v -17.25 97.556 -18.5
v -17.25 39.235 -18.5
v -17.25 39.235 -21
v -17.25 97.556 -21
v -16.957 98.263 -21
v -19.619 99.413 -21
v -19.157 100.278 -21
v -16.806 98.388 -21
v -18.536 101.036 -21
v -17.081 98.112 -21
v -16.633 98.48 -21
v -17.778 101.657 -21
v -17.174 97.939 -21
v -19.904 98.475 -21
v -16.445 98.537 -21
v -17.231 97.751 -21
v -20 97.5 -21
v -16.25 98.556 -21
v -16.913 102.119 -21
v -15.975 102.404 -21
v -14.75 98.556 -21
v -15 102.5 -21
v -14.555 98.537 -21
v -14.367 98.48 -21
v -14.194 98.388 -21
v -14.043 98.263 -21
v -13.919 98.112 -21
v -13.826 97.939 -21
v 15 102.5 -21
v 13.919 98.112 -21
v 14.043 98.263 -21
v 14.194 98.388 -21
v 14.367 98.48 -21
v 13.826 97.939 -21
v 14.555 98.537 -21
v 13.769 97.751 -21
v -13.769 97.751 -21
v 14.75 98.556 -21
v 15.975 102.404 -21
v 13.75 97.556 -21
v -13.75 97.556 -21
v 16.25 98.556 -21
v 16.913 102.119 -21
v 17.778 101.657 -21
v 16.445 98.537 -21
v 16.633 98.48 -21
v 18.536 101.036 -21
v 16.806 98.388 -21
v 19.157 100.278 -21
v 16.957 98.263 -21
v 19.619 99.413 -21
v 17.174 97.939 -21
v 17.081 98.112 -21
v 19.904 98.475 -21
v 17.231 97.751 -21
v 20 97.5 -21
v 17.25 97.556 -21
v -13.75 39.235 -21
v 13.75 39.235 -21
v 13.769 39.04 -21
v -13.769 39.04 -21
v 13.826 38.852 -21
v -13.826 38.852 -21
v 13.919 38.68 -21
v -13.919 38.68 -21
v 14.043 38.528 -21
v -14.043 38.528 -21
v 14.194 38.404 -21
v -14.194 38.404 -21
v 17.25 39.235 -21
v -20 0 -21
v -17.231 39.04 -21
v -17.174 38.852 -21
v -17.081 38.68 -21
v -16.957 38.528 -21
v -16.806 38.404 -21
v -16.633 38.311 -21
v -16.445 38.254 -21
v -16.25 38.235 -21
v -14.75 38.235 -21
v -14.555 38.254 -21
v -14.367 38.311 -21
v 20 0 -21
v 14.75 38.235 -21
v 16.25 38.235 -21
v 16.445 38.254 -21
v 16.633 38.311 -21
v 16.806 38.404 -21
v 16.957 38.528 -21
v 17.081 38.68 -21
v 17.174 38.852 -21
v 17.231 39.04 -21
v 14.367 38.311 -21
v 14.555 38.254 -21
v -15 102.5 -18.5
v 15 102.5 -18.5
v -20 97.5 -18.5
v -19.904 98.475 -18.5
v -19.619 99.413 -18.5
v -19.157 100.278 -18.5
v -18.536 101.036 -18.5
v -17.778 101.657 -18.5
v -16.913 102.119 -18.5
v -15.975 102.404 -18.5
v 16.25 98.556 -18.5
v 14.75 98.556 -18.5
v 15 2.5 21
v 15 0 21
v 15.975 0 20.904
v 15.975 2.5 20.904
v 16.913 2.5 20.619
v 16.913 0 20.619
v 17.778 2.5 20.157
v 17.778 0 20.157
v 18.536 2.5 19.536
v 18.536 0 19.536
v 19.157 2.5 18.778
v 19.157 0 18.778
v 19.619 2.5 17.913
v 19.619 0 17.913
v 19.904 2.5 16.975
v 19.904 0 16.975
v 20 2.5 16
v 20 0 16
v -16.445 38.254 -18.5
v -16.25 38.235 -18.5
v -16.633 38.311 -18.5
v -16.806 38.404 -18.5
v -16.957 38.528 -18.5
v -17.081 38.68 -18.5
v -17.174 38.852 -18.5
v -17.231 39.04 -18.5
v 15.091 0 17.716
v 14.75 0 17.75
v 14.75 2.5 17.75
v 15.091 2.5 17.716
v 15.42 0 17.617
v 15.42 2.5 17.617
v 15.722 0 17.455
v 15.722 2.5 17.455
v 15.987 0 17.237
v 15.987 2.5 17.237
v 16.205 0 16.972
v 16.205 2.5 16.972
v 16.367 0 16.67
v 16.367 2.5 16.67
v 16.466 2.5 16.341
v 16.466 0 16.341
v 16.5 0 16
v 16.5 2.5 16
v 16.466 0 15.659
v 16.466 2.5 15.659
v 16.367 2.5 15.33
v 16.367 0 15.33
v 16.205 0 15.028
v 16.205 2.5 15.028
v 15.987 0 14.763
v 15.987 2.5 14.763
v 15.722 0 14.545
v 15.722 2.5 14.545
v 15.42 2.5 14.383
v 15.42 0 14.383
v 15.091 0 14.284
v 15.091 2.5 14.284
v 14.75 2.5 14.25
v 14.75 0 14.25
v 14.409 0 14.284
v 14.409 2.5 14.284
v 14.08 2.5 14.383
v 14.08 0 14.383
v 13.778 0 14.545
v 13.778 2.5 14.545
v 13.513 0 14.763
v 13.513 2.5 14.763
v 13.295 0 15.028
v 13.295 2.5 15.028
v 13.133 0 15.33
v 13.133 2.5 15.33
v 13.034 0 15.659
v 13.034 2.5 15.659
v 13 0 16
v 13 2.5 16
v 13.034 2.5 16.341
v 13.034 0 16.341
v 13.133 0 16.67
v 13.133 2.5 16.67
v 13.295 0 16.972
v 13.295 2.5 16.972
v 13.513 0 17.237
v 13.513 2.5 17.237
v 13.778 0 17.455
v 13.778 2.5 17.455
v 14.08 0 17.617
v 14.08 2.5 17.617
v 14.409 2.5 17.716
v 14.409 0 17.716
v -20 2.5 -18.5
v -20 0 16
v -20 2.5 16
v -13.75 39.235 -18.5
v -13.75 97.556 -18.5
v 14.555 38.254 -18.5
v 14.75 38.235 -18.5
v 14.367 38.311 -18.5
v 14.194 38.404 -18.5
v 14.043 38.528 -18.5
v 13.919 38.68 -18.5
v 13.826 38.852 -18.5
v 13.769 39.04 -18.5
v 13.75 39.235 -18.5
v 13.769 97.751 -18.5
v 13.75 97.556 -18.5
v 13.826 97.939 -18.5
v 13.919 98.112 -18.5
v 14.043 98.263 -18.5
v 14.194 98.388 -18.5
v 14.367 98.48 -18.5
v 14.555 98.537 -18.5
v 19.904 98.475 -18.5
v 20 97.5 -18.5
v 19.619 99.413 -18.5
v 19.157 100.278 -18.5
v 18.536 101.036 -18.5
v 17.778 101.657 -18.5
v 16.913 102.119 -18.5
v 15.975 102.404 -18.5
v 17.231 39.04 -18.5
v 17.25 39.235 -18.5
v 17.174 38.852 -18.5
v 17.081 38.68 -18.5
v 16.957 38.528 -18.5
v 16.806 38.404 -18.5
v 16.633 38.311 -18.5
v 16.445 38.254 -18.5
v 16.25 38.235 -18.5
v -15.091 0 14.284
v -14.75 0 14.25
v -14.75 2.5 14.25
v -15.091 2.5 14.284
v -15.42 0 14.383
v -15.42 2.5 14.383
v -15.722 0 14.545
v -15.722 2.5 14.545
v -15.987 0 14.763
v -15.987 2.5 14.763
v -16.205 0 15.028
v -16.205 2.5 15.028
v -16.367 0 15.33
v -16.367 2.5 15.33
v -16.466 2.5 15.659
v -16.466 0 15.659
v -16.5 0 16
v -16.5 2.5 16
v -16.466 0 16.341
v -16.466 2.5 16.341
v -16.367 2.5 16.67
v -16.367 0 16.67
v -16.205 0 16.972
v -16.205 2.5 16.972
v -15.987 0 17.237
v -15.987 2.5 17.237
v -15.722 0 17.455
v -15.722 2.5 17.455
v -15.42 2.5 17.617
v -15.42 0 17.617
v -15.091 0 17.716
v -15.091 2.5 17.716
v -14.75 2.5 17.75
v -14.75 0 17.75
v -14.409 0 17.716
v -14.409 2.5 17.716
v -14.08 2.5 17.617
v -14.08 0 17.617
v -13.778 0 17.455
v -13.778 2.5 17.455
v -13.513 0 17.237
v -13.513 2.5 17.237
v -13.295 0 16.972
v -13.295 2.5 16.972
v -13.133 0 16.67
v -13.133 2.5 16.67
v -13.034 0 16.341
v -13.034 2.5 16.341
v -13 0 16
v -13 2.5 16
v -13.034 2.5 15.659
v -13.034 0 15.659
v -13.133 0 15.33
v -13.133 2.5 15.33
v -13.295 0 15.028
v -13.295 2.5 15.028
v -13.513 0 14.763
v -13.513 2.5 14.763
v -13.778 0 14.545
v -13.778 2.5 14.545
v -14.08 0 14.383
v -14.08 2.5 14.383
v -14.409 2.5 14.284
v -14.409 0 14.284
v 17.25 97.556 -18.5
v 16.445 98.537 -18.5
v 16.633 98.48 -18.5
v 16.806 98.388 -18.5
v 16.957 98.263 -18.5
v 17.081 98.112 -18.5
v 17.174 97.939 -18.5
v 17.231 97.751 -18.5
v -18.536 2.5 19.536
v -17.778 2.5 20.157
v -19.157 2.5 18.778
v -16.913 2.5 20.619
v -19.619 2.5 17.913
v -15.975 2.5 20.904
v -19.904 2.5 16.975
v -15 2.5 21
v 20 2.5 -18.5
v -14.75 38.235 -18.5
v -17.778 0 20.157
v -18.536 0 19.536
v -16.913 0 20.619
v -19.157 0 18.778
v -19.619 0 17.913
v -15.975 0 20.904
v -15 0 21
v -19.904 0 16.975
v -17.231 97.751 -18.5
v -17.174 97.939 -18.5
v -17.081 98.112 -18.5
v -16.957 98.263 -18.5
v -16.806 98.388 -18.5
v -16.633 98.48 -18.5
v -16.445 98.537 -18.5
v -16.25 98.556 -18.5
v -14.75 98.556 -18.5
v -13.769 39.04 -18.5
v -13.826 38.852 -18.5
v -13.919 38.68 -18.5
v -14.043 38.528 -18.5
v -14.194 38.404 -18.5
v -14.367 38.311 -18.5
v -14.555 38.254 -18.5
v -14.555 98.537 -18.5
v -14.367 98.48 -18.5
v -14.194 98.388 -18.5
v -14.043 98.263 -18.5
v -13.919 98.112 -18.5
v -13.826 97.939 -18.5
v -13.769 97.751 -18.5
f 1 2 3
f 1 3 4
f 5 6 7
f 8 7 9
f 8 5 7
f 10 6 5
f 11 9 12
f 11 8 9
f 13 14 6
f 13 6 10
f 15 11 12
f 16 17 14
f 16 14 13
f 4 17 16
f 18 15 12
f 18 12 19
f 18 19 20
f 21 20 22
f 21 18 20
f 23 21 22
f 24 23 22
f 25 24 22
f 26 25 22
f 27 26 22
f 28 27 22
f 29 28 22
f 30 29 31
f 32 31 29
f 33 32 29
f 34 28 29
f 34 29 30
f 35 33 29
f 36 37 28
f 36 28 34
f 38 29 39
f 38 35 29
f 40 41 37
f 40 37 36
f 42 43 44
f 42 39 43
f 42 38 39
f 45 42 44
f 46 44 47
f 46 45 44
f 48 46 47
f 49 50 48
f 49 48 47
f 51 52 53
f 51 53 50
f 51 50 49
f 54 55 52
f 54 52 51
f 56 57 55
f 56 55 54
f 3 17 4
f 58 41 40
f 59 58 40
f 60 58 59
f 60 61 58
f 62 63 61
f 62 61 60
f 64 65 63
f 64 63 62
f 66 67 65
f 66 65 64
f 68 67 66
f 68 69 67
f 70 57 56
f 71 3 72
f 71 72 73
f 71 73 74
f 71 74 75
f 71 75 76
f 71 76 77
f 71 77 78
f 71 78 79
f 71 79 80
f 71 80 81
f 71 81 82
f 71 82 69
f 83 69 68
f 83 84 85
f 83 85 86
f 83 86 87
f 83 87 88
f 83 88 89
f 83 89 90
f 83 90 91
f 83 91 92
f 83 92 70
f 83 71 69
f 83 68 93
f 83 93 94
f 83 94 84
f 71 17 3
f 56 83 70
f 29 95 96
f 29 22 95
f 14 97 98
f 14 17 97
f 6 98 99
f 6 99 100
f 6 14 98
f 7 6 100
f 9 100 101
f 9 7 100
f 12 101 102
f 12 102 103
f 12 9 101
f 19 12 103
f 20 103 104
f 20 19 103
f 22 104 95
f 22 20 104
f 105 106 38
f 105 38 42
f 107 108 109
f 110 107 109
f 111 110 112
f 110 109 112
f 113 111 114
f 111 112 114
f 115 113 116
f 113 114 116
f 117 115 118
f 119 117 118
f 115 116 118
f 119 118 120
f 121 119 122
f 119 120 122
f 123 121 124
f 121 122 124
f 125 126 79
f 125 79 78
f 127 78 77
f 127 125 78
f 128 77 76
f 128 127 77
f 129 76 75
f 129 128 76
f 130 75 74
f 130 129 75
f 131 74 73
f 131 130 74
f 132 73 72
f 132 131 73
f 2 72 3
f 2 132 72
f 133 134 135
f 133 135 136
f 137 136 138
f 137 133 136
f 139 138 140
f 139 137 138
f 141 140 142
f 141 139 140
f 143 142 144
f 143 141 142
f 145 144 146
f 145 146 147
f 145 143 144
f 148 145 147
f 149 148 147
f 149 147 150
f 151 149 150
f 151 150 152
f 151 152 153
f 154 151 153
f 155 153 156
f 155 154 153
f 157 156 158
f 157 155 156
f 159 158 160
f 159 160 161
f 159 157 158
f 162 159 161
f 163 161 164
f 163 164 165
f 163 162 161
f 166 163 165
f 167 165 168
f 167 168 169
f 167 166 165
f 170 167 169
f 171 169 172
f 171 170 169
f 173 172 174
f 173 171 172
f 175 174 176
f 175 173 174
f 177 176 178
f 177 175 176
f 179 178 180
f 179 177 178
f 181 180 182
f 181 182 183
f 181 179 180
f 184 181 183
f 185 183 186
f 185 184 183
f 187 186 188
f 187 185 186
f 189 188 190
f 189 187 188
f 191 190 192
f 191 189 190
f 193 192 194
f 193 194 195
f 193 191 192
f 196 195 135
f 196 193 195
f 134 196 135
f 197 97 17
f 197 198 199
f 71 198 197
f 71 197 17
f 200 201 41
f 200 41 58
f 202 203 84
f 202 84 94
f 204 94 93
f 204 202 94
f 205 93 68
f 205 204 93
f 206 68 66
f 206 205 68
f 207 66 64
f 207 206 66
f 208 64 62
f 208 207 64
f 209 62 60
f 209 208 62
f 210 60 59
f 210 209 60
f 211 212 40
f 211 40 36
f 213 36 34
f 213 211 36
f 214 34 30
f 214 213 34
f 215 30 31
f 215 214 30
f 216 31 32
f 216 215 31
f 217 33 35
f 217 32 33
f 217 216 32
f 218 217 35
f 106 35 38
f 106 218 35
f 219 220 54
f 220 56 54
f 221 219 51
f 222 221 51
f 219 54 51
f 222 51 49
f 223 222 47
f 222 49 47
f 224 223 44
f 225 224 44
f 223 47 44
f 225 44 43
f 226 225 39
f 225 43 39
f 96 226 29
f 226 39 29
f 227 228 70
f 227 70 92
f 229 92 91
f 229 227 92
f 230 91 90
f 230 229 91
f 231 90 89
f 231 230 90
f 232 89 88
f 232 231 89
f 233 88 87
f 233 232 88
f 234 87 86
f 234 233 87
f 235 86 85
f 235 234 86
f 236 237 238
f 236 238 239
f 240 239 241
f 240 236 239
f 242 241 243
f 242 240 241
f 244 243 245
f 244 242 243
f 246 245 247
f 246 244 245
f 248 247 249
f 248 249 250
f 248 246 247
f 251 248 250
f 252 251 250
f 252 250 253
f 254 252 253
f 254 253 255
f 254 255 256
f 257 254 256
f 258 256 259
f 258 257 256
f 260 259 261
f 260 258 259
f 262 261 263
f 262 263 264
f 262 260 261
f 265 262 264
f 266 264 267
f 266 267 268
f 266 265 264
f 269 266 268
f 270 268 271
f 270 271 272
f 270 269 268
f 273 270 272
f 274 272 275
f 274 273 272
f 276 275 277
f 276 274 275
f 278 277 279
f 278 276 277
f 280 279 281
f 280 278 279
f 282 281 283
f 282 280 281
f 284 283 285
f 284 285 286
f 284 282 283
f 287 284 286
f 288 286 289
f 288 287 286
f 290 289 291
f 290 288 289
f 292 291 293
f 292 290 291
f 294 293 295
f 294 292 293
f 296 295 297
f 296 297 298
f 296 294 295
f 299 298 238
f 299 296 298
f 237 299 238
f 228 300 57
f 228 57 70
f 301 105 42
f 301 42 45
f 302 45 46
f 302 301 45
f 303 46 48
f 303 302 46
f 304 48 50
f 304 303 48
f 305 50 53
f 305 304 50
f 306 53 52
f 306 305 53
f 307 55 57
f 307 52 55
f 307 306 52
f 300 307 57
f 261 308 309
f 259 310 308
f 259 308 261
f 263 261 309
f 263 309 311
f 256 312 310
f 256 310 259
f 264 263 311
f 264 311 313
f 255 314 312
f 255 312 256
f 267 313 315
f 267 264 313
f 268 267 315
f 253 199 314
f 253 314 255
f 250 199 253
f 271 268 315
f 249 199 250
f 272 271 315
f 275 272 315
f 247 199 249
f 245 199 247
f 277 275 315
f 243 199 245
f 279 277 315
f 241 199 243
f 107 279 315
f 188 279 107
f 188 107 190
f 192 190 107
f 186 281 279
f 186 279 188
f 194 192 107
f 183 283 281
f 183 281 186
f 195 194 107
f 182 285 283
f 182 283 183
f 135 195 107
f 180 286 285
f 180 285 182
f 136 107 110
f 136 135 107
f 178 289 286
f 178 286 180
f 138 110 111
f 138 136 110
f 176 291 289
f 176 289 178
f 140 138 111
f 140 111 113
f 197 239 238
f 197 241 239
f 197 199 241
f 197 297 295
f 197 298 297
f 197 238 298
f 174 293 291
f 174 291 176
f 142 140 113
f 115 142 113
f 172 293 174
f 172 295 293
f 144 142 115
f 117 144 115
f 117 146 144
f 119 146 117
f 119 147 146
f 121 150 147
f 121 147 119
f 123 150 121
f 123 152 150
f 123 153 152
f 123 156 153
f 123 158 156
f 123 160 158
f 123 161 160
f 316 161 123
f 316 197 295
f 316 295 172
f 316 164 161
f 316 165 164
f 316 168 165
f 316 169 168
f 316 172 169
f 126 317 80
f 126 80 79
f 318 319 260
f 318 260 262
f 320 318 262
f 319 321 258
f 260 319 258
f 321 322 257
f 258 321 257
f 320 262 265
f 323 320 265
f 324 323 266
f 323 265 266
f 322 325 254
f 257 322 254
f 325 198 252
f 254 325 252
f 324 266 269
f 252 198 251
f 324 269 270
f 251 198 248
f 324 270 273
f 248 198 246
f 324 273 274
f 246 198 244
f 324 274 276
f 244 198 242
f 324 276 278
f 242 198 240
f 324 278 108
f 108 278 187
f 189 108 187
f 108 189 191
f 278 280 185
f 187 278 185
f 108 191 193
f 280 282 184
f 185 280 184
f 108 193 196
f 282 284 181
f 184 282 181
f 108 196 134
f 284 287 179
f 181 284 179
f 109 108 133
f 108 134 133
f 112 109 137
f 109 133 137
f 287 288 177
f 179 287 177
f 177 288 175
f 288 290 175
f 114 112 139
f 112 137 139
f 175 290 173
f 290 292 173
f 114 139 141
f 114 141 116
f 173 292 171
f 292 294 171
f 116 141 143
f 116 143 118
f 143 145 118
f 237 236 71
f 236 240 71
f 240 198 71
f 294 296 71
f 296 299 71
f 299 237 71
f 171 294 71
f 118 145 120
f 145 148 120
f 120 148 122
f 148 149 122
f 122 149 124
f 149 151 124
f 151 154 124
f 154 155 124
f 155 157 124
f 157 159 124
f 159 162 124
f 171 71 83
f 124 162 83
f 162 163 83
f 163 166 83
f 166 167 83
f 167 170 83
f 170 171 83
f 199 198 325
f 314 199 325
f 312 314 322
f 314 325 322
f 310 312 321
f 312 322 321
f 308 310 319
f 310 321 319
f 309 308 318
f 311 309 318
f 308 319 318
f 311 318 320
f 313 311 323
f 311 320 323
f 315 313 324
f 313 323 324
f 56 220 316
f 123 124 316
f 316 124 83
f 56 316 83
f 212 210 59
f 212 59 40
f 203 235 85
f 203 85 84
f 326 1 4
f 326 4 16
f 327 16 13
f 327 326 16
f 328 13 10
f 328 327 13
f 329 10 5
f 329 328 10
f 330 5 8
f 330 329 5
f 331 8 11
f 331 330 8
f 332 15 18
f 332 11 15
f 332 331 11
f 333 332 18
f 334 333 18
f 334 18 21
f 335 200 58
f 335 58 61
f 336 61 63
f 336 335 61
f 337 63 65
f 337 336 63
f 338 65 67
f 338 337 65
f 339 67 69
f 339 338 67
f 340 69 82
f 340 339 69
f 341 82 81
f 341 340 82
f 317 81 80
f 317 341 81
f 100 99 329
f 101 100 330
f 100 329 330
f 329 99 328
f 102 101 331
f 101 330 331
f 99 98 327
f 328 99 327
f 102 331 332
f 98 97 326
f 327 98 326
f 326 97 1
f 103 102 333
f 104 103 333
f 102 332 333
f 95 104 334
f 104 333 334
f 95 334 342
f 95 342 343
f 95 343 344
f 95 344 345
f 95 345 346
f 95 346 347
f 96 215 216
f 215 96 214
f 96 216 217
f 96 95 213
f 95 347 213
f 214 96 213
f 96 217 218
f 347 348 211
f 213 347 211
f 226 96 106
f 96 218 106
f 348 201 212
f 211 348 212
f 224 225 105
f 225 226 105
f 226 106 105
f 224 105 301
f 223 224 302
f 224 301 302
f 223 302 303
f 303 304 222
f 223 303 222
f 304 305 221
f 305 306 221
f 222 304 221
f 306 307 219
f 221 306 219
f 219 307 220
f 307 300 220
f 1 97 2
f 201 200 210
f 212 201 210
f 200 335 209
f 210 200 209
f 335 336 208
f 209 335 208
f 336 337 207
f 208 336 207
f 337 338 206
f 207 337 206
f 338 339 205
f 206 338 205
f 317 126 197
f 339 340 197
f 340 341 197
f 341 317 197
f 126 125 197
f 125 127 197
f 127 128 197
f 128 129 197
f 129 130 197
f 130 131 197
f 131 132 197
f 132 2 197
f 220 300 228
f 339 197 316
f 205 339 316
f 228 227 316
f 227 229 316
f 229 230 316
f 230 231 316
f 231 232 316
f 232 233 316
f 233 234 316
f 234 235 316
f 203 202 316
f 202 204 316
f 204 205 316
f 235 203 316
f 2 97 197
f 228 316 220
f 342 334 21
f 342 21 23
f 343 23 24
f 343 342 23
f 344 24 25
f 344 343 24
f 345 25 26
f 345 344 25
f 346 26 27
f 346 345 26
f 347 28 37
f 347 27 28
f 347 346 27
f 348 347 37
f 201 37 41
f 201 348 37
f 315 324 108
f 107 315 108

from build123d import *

# Parameters (mm, degrees)
SKETCH1_R           = 1.75
BOSS_EXTRUDE1_DEPTH = 2.5
SKETCH2_W           = 40
SKETCH2_H           = 2.5
BOSS_EXTRUDE2_DEPTH = 100
FILLET1_R           = 5
CUT_EXTRUDE1_DEPTH  = 112.653481809


with BuildPart() as part:
    # Sketch1 → Boss-Extrude1 (new body)
    with BuildSketch(Plane(origin=(0, 0, 0), x_dir=(1, 0, 0), z_dir=(0, 1, 0))):
        with BuildLine():
            Line((20, 21), (-20, 21))
            Line((-20, 21), (-20, -16))
            ThreePointArc((-20, -16), (-18.535533906, -19.535533906), (-15, -21))
            Line((-15, -21), (15, -21))
            ThreePointArc((15, -21), (18.535533906, -19.535533906), (20, -16))
            Line((20, -16), (20, 21))
        make_face()
        with Locations(Location((14.75, -16, 0), (0, 0, 270))):
            Circle(SKETCH1_R, mode=Mode.SUBTRACT)
        with Locations(Location((-14.75, -16, 0), (0, 0, 90))):
            Circle(SKETCH1_R, mode=Mode.SUBTRACT)
    extrude(amount=BOSS_EXTRUDE1_DEPTH)

    # Sketch2 → Boss-Extrude2 (add)
    with BuildSketch(Plane(origin=(0, 2.5, 0), x_dir=(1, 0, 0), z_dir=(0, 1, 0))):
        with Locations((0, 19.75)):
            Rectangle(SKETCH2_W, SKETCH2_H)
    extrude(amount=BOSS_EXTRUDE2_DEPTH)

    # Fillet1
    fillet1_edges = [part.edges().sort_by_distance(p)[0] for p in [
        (-20, 102.5, -19.75),
        (20, 102.5, -19.75),
    ]]
    fillet(fillet1_edges, radius=FILLET1_R)

    # Sketch3 → Cut-Extrude1 (cut, through all)
    with BuildSketch(Plane.XY.offset(-18.5)):
        with BuildLine():
            Line((17.25, 92.632945603), (17.25, 39.235172541))
            ThreePointArc((17.25, 39.235172541), (16.957106781, 38.52806576), (16.25, 38.235172541))
            Line((16.25, 38.235172541), (14.75, 38.235172541))
            ThreePointArc((14.75, 38.235172541), (14.042893219, 38.52806576), (13.75, 39.235172541))
            Line((13.75, 39.235172541), (13.75, 97.556357651))
            ThreePointArc((13.75, 97.556357651), (14.042893219, 98.263464432), (14.75, 98.556357651))
            Line((14.75, 98.556357651), (16.25, 98.556357651))
            ThreePointArc((16.25, 98.556357651), (16.957106781, 98.263464432), (17.25, 97.556357651))
            Line((17.25, 97.556357651), (17.25, 92.632945603))
        make_face()
        with BuildLine():
            Line((-14.75, 38.235172541), (-16.25, 38.235172541))
            ThreePointArc((-16.25, 38.235172541), (-16.957106781, 38.52806576), (-17.25, 39.235172541))
            Line((-17.25, 39.235172541), (-17.25, 92.632945603))
            Line((-17.25, 92.632945603), (-17.25, 97.556357651))
            ThreePointArc((-17.25, 97.556357651), (-16.957106781, 98.263464432), (-16.25, 98.556357651))
            Line((-16.25, 98.556357651), (-14.75, 98.556357651))
            ThreePointArc((-14.75, 98.556357651), (-14.042893219, 98.263464432), (-13.75, 97.556357651))
            Line((-13.75, 97.556357651), (-13.75, 39.235172541))
            ThreePointArc((-13.75, 39.235172541), (-14.042893219, 38.52806576), (-14.75, 38.235172541))
        make_face()
    extrude(amount=-CUT_EXTRUDE1_DEPTH, mode=Mode.SUBTRACT)


solid = part.part
